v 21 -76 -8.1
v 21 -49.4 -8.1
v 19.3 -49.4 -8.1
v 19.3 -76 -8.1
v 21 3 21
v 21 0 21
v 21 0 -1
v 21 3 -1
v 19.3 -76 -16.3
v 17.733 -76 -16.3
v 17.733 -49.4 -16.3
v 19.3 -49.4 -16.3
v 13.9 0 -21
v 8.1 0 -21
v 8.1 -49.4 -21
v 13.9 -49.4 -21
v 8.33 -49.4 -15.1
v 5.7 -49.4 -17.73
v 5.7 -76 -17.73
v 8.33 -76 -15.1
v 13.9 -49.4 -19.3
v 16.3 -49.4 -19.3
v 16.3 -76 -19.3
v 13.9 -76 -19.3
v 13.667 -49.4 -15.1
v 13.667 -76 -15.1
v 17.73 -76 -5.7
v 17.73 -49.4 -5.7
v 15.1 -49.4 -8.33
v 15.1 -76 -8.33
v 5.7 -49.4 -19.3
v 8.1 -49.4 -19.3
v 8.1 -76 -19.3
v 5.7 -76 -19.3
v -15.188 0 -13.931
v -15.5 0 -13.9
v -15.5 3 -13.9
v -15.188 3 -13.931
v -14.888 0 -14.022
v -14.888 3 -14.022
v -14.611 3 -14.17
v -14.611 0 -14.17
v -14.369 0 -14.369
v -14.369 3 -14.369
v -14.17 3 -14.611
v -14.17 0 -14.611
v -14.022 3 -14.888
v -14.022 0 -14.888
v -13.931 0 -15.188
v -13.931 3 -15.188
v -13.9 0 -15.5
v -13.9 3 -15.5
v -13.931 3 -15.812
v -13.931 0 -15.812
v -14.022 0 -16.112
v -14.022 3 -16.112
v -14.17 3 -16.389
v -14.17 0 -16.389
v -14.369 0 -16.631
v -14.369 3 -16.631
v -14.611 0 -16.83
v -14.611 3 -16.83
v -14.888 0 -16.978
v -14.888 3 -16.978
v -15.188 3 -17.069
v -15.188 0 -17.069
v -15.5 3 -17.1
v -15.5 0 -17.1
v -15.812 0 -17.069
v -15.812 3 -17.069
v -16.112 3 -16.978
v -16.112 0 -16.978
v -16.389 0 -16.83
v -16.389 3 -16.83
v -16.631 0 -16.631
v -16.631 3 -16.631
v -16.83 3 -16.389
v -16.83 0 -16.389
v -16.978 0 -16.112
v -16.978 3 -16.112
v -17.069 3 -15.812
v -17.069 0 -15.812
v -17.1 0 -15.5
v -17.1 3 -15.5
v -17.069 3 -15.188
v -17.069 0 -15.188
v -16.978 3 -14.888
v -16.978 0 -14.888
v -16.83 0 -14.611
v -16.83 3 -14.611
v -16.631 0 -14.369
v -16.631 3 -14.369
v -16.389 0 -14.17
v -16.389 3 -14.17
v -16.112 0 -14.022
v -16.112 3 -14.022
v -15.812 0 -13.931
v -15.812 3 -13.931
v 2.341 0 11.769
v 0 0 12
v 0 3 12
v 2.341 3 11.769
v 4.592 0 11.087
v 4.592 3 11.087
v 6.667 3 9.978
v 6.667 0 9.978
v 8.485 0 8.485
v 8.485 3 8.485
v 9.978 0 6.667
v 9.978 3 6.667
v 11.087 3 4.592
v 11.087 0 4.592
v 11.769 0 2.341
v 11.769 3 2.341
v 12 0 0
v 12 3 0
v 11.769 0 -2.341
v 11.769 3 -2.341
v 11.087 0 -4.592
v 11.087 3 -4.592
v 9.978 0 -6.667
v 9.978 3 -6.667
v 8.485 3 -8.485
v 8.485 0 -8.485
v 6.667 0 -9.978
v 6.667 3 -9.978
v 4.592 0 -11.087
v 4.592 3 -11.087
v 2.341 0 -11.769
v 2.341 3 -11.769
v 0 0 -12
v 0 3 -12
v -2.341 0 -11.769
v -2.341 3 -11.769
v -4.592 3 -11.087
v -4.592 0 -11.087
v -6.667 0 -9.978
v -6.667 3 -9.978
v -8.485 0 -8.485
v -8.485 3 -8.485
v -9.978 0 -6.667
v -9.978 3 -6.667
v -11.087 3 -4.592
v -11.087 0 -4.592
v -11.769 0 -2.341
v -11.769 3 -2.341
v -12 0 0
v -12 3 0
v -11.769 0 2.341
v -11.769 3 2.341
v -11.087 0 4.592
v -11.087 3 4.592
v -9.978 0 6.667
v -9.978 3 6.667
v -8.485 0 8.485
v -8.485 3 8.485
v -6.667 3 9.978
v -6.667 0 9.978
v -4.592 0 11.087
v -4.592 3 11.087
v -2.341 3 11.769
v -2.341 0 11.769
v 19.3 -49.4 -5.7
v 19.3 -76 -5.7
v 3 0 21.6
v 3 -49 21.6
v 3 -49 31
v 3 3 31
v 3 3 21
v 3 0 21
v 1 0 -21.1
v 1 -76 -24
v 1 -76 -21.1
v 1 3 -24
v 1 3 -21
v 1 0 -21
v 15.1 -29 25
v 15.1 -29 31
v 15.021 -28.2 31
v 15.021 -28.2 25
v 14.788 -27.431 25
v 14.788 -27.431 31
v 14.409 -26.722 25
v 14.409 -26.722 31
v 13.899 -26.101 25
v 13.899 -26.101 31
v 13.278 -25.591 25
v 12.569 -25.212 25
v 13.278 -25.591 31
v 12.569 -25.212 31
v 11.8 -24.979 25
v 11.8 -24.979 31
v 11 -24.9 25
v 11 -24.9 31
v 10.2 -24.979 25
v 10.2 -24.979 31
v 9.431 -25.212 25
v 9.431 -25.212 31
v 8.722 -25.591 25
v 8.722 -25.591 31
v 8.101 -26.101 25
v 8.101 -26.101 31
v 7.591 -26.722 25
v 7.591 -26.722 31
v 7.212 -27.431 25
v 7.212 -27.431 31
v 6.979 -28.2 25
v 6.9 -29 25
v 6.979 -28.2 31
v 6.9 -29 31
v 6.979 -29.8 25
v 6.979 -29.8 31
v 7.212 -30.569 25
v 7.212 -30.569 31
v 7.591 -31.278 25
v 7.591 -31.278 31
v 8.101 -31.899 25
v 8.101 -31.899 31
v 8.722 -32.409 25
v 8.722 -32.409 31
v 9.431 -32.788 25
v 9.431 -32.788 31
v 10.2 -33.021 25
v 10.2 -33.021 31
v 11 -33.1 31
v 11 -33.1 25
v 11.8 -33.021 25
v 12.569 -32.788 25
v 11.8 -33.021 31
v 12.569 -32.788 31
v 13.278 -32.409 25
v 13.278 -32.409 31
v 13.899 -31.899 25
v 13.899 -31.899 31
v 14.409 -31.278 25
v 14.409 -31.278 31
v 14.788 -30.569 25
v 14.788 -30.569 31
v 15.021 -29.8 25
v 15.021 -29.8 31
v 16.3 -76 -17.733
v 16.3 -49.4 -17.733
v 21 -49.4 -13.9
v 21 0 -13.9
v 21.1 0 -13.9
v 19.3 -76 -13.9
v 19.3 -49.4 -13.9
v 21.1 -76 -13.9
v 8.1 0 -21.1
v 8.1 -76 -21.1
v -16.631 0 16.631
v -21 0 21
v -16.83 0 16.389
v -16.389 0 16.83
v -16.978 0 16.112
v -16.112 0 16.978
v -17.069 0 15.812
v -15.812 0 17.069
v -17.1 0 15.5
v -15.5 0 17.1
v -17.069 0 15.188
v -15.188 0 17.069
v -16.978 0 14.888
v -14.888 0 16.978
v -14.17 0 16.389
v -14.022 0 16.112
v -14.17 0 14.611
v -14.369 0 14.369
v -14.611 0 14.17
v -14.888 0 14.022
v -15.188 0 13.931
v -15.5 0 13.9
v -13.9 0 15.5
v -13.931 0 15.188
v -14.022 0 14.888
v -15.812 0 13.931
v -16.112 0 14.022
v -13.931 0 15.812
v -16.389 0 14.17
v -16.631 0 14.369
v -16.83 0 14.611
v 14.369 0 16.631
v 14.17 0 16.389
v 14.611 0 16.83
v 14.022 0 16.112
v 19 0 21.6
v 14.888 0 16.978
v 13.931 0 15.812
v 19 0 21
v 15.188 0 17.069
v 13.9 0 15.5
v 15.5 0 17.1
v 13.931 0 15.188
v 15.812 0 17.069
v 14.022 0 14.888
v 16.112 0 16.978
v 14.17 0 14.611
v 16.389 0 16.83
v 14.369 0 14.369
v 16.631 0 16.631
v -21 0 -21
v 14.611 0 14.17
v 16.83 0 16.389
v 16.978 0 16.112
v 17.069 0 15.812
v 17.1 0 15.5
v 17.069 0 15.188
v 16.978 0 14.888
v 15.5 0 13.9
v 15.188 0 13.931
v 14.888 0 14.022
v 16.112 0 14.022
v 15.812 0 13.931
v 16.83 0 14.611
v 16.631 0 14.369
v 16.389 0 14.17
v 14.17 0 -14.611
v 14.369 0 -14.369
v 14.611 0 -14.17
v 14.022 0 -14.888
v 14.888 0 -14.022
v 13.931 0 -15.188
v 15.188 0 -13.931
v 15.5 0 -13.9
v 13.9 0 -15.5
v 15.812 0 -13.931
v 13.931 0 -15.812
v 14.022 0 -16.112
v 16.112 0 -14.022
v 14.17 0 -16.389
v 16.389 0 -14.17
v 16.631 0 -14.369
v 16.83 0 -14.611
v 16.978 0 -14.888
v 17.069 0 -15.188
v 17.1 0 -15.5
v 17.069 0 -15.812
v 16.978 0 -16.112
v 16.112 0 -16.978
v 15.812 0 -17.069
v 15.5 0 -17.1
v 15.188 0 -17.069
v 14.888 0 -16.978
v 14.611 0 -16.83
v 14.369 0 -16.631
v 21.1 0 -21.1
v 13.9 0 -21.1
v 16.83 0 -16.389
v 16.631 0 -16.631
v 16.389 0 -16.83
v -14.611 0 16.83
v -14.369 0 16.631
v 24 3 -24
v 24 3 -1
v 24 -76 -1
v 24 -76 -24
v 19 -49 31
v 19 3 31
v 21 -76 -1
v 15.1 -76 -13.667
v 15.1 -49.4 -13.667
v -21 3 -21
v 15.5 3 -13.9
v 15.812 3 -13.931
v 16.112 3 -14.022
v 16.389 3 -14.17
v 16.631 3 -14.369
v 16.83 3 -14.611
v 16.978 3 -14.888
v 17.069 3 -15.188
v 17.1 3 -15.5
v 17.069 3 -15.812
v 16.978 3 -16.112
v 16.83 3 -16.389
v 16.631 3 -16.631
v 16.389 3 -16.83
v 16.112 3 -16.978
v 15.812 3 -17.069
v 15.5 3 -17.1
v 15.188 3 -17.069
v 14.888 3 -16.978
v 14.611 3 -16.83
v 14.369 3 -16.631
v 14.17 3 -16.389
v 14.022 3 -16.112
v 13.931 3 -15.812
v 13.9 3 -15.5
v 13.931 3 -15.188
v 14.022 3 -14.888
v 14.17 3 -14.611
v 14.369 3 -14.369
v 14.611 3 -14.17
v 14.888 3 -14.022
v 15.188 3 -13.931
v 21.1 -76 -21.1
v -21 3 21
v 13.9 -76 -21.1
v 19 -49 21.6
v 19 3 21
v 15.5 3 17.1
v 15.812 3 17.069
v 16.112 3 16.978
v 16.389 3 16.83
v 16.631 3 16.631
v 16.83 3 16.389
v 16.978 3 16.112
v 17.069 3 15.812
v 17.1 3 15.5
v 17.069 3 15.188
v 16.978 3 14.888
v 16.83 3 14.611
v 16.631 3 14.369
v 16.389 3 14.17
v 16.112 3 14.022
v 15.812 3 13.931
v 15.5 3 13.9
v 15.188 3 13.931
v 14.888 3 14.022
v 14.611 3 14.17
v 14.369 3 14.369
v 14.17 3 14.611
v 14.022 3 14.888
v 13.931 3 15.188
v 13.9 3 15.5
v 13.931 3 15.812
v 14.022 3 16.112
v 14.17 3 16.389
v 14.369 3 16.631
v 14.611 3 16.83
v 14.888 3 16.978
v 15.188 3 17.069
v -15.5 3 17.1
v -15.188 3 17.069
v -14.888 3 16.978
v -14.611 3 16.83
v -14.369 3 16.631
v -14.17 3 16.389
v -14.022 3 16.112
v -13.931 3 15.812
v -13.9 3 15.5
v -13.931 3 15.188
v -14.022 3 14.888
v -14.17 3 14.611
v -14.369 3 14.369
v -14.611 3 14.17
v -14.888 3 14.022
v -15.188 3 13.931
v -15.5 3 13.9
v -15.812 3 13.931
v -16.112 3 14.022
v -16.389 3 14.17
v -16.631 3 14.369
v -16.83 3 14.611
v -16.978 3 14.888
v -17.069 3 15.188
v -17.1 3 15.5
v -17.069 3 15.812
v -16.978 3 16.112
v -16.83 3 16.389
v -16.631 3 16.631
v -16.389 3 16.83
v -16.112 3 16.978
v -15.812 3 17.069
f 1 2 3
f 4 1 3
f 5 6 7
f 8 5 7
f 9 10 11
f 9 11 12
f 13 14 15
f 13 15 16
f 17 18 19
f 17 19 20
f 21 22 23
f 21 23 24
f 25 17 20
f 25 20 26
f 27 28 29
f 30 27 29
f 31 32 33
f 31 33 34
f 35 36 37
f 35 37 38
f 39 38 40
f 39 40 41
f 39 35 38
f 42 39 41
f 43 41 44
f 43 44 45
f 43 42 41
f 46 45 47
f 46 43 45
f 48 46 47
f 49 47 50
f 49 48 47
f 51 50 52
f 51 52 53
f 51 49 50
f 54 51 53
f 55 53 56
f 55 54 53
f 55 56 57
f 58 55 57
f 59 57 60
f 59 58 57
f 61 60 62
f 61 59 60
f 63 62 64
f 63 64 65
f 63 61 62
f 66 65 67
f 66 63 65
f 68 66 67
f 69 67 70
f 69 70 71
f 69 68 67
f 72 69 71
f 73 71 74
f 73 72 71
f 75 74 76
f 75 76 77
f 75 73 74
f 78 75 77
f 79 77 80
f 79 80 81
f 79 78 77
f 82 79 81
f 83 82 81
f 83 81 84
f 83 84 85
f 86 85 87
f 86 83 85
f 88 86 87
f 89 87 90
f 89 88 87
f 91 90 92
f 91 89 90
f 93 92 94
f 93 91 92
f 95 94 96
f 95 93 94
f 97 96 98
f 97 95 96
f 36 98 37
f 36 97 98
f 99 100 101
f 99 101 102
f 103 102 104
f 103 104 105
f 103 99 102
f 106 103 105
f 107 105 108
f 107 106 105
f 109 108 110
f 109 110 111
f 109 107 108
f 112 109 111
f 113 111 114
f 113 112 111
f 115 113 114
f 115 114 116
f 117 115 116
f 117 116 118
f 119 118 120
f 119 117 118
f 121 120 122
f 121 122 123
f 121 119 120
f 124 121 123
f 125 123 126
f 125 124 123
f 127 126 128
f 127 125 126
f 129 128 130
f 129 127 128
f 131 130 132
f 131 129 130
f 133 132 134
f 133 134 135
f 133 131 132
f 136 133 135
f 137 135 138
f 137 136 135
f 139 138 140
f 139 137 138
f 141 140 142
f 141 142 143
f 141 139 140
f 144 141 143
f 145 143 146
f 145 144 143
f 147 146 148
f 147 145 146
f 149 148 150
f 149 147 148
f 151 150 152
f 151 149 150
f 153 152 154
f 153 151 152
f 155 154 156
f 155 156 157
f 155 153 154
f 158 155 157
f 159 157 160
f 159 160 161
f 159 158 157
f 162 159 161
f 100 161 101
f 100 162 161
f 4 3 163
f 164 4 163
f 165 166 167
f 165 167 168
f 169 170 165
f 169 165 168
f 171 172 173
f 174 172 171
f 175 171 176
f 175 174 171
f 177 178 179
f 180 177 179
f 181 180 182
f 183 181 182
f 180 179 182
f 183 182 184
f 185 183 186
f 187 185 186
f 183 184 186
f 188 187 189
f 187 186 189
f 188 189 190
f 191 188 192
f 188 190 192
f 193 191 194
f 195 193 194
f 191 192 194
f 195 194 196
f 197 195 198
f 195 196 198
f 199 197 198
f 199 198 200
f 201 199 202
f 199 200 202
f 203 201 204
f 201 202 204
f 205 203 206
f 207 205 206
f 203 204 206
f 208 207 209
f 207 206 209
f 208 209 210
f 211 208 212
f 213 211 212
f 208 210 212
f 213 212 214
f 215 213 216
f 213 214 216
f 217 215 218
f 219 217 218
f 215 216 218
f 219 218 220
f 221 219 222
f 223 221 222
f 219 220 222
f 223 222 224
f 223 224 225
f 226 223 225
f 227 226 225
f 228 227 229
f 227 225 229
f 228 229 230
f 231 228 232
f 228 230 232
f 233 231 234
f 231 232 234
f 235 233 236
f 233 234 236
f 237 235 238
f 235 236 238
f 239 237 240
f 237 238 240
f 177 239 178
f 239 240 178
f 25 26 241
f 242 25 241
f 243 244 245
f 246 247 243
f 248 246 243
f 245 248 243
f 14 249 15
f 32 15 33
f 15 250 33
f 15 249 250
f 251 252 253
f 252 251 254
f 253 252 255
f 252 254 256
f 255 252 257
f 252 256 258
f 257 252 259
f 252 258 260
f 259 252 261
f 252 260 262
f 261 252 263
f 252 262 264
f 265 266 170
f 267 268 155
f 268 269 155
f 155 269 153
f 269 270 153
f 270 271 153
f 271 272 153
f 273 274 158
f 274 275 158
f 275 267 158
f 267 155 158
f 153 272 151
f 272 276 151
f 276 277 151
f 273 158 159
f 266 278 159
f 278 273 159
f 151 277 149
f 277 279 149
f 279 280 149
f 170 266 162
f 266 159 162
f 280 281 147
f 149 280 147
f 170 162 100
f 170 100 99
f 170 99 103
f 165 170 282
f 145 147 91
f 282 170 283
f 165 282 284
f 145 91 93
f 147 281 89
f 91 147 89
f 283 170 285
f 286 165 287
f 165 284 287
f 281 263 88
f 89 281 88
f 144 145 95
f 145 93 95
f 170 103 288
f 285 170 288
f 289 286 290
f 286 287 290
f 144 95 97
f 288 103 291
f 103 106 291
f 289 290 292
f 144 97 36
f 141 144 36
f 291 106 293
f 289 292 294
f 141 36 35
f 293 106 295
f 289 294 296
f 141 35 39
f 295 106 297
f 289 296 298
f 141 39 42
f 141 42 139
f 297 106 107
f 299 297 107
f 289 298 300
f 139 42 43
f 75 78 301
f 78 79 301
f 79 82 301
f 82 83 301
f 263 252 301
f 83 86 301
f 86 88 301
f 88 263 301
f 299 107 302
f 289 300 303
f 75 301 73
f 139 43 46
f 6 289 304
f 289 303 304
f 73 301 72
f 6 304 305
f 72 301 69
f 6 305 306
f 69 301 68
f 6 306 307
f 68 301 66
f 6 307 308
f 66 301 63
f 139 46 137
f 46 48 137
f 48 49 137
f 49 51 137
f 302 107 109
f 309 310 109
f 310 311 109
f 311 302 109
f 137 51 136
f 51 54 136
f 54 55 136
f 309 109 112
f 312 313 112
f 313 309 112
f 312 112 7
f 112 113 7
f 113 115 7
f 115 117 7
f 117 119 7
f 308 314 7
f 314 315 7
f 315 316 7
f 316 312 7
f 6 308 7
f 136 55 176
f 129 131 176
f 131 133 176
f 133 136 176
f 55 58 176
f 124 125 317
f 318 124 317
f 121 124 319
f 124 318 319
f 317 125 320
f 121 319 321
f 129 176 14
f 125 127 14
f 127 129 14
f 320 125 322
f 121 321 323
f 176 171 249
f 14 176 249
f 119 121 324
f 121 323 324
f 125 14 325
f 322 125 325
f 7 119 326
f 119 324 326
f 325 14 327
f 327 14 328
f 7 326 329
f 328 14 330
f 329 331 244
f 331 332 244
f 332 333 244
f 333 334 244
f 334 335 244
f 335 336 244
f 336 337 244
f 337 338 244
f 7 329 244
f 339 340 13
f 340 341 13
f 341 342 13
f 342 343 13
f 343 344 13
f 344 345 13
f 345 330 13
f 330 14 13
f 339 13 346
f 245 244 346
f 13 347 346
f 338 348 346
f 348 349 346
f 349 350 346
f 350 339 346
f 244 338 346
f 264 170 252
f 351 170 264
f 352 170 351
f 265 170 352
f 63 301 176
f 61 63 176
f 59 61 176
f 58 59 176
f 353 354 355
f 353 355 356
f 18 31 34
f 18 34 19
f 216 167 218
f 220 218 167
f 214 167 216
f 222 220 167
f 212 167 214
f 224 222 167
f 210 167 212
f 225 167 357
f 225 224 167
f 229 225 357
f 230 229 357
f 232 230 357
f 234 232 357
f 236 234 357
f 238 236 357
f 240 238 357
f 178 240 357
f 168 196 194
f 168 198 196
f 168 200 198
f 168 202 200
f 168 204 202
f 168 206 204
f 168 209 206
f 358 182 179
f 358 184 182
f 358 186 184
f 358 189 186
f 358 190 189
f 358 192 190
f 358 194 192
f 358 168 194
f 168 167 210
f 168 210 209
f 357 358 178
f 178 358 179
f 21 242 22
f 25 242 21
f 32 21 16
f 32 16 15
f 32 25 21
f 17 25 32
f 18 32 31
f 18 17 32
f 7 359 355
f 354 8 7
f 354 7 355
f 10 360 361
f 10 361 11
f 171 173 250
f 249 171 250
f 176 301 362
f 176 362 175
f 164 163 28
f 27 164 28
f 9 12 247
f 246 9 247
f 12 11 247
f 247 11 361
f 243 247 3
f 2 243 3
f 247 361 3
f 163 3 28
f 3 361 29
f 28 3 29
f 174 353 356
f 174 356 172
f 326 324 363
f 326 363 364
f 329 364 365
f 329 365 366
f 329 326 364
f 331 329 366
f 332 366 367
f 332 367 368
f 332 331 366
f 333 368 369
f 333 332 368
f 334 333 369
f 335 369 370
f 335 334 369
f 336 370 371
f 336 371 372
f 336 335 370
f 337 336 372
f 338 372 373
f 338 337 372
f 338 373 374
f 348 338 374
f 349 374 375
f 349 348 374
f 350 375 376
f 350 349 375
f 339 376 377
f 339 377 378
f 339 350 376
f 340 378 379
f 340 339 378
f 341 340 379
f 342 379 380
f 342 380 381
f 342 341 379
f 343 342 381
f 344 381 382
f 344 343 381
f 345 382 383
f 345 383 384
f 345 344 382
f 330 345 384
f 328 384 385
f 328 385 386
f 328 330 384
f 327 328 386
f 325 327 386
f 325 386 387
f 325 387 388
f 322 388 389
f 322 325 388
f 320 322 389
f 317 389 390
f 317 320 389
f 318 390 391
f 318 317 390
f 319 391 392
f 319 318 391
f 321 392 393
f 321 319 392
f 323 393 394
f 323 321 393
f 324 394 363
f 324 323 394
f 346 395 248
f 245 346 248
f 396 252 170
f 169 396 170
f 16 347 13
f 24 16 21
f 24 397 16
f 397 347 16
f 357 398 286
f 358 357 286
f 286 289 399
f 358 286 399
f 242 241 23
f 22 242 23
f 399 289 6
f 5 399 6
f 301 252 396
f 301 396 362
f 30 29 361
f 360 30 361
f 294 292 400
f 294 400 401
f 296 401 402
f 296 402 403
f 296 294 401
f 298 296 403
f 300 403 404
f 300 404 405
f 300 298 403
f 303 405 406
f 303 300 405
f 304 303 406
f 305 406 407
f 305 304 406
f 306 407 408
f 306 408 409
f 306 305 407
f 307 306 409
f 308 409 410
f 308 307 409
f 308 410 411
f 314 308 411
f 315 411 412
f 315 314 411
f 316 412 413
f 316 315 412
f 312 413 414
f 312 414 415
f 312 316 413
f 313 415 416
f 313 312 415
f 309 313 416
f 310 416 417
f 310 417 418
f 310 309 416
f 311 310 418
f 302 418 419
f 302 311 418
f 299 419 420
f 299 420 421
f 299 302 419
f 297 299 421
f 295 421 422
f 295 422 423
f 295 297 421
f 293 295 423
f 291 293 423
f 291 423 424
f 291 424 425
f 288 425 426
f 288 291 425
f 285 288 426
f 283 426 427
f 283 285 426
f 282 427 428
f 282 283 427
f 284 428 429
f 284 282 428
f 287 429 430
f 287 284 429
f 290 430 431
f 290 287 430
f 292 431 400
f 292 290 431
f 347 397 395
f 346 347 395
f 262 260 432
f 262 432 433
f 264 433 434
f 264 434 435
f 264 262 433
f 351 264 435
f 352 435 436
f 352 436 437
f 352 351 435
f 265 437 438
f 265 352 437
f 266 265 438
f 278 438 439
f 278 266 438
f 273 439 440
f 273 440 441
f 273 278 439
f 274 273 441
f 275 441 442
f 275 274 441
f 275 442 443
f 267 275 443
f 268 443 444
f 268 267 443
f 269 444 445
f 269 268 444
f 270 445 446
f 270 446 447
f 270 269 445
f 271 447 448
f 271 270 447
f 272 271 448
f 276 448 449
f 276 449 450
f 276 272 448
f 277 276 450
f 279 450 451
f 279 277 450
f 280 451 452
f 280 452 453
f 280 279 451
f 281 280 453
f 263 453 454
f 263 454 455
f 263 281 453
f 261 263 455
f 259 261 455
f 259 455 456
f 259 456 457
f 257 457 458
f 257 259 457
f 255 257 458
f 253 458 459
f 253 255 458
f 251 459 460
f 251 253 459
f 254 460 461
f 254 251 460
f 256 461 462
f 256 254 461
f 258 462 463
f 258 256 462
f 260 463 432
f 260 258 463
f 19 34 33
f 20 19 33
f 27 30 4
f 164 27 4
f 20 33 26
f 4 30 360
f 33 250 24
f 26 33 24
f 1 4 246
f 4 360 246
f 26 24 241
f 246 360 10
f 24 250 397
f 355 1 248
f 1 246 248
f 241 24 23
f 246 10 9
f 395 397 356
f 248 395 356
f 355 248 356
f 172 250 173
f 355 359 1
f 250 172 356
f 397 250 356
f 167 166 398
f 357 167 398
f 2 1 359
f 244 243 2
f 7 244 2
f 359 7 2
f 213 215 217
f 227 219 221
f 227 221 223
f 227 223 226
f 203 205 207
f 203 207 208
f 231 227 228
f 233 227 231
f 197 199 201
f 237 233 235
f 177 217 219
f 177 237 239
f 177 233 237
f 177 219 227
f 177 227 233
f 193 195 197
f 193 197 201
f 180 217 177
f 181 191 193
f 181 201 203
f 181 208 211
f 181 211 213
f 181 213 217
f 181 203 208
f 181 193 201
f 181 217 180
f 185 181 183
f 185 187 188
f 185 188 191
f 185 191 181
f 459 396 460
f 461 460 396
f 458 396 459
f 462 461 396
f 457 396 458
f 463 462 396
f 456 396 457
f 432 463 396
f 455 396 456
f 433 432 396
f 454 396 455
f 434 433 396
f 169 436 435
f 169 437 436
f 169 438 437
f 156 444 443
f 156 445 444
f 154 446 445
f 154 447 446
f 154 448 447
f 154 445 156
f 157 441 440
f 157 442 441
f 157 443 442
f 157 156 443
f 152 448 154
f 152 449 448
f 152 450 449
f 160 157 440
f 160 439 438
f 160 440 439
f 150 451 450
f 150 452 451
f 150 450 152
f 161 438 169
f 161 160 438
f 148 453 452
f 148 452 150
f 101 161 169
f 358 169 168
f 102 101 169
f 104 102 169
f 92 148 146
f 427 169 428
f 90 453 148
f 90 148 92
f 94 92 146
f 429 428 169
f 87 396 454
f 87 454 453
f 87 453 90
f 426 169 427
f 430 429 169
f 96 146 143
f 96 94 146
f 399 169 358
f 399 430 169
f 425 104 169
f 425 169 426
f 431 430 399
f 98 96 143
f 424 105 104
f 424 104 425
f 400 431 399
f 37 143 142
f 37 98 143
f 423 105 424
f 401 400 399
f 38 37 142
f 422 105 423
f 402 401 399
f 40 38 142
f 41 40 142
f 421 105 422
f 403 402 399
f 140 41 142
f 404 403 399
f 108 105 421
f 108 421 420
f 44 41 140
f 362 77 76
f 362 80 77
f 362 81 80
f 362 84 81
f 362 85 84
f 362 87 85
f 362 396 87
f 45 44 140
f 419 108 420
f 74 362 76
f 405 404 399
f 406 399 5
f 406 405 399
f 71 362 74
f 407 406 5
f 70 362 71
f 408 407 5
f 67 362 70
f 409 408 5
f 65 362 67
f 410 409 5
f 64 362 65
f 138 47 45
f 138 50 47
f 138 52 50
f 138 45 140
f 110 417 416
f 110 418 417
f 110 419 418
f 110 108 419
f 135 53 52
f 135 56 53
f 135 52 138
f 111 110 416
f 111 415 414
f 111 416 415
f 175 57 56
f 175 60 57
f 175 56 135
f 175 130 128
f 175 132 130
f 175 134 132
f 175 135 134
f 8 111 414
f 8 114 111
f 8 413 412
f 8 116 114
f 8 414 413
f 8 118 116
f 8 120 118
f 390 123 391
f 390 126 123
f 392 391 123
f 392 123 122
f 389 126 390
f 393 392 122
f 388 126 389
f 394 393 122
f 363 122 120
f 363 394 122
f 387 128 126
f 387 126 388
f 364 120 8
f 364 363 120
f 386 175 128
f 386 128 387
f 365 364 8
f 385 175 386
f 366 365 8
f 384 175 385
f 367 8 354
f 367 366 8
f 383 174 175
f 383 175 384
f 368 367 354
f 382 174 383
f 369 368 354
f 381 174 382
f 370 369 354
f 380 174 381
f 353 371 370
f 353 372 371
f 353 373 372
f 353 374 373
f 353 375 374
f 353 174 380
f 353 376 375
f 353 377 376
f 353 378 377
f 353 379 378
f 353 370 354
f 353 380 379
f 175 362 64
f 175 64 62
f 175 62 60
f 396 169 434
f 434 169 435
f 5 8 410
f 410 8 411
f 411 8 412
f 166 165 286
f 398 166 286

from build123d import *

# Parameters (mm, degrees)
SKETCH_1_W          = 42
SKETCH_1_H          = 42
SKETCH_1_R          = 1.6
SKETCH_1_R_2        = 12
EXTRUDE_1_DEPTH     = 3
SKETCH_2_W          = 16
SKETCH_2_H          = 52
EXTRUDE_2_DEPTH     = 10
SKETCH_3_R          = 4.1
CUT_EXTRUDE_1_DEPTH = 6
EXTRUDE_3_DEPTH     = 79
SKETCH_7_W          = 16
SKETCH_7_H          = 0.6
CUT_EXTRUDE_4_DEPTH = 49
EXTRUDE_START       = 49.4
EXTRUDE_4_DEPTH     = 26.6
SKETCH_10_W         = 7.1
SKETCH_10_H         = 0.1
SKETCH_10_W_2       = 0.1
SKETCH_10_H_2       = 7.1
CUT_EXTRUDE_5_DEPTH = 76


with BuildPart() as part:
    # 草图1 → 凸台-拉伸1 (new body)
    with BuildSketch(Plane(origin=(0, 0, 0), x_dir=(1, 0, 0), z_dir=(0, 1, 0))):
        Rectangle(SKETCH_1_W, SKETCH_1_H)
        with Locations(Location((15.5, 15.5, 0), (0, 0, 270))):
            Circle(SKETCH_1_R, mode=Mode.SUBTRACT)
        with Locations(Location((15.5, -15.5, 0), (0, 0, 270))):
            Circle(SKETCH_1_R, mode=Mode.SUBTRACT)
        with Locations(Location((-15.5, -15.5, 0), (0, 0, 270))):
            Circle(SKETCH_1_R, mode=Mode.SUBTRACT)
        with Locations(Location((-15.5, 15.5, 0), (0, 0, 270))):
            Circle(SKETCH_1_R, mode=Mode.SUBTRACT)
        with Locations(Location((0, 0, 0), (0, 0, 270))):
            Circle(SKETCH_1_R_2, mode=Mode.SUBTRACT)
    extrude(amount=EXTRUDE_1_DEPTH)

    # 草图2 → 凸台-拉伸2 (add)
    with BuildSketch(Plane.XY.offset(21)):
        with Locations((11, -23)):
            Rectangle(SKETCH_2_W, SKETCH_2_H)
    extrude(amount=EXTRUDE_2_DEPTH)

    # 草图3 → 切除-拉伸1 (cut)
    with BuildSketch(Plane.XY.offset(31)):
        with Locations((11, -29)):
            Circle(SKETCH_3_R)
    extrude(amount=-CUT_EXTRUDE_1_DEPTH, mode=Mode.SUBTRACT)

    # 草图4 → 凸台-拉伸3 (add)
    with BuildSketch(Plane(origin=(0, 3, 0), x_dir=(1, 0, 0), z_dir=(0, 1, 0))):
        Polygon((1, 21), (21, 21), (21, 1), (24, 1), (24, 24), (1, 24), align=None)
    extrude(amount=-EXTRUDE_3_DEPTH)

    # 草图7 → 切除-拉伸4 (cut)
    with BuildSketch(Plane.XZ.offset(49)):
        with Locations((11, 21.3)):
            Rectangle(SKETCH_7_W, SKETCH_7_H)
    extrude(amount=-CUT_EXTRUDE_4_DEPTH, mode=Mode.SUBTRACT)

    # 草图9 → 凸台-拉伸4 (add)
    with BuildSketch(Plane.XZ.offset(EXTRUDE_START)):
        Polygon((8.33, -15.1), (13.667157288, -15.1), (16.3, -17.732842712), (16.3, -19.3), (13.9, -19.3), (13.9, -21), (8.1, -21), (8.1, -19.3), (5.7, -19.3), (5.7, -17.73), align=None)
    extrude_4 = extrude(amount=EXTRUDE_4_DEPTH)

    # 镜向1: 凸台-拉伸4 across plane
    add(extrude_4.mirror(Plane(origin=(0, 0, 0), x_dir=(-0.7071067811865475, 0, 0.7071067811865476), z_dir=(-0.7071067811865478, 0, -0.7071067811865474))))

    # 草图10 → 切除-拉伸5 (cut)
    with BuildSketch(Plane.XZ.offset(76)):
        with Locations((4.55, -21.05)):
            Rectangle(SKETCH_10_W, SKETCH_10_H)
        with Locations((17.45, -21.05)):
            Rectangle(SKETCH_10_W, SKETCH_10_H)
        with Locations((21.05, -21.05)):
            Rectangle(SKETCH_10_W_2, SKETCH_10_H)
        with Locations((21.05, -17.45)):
            Rectangle(SKETCH_10_W_2, SKETCH_10_H_2)
    extrude(amount=-CUT_EXTRUDE_5_DEPTH, mode=Mode.SUBTRACT)


solid = part.part
